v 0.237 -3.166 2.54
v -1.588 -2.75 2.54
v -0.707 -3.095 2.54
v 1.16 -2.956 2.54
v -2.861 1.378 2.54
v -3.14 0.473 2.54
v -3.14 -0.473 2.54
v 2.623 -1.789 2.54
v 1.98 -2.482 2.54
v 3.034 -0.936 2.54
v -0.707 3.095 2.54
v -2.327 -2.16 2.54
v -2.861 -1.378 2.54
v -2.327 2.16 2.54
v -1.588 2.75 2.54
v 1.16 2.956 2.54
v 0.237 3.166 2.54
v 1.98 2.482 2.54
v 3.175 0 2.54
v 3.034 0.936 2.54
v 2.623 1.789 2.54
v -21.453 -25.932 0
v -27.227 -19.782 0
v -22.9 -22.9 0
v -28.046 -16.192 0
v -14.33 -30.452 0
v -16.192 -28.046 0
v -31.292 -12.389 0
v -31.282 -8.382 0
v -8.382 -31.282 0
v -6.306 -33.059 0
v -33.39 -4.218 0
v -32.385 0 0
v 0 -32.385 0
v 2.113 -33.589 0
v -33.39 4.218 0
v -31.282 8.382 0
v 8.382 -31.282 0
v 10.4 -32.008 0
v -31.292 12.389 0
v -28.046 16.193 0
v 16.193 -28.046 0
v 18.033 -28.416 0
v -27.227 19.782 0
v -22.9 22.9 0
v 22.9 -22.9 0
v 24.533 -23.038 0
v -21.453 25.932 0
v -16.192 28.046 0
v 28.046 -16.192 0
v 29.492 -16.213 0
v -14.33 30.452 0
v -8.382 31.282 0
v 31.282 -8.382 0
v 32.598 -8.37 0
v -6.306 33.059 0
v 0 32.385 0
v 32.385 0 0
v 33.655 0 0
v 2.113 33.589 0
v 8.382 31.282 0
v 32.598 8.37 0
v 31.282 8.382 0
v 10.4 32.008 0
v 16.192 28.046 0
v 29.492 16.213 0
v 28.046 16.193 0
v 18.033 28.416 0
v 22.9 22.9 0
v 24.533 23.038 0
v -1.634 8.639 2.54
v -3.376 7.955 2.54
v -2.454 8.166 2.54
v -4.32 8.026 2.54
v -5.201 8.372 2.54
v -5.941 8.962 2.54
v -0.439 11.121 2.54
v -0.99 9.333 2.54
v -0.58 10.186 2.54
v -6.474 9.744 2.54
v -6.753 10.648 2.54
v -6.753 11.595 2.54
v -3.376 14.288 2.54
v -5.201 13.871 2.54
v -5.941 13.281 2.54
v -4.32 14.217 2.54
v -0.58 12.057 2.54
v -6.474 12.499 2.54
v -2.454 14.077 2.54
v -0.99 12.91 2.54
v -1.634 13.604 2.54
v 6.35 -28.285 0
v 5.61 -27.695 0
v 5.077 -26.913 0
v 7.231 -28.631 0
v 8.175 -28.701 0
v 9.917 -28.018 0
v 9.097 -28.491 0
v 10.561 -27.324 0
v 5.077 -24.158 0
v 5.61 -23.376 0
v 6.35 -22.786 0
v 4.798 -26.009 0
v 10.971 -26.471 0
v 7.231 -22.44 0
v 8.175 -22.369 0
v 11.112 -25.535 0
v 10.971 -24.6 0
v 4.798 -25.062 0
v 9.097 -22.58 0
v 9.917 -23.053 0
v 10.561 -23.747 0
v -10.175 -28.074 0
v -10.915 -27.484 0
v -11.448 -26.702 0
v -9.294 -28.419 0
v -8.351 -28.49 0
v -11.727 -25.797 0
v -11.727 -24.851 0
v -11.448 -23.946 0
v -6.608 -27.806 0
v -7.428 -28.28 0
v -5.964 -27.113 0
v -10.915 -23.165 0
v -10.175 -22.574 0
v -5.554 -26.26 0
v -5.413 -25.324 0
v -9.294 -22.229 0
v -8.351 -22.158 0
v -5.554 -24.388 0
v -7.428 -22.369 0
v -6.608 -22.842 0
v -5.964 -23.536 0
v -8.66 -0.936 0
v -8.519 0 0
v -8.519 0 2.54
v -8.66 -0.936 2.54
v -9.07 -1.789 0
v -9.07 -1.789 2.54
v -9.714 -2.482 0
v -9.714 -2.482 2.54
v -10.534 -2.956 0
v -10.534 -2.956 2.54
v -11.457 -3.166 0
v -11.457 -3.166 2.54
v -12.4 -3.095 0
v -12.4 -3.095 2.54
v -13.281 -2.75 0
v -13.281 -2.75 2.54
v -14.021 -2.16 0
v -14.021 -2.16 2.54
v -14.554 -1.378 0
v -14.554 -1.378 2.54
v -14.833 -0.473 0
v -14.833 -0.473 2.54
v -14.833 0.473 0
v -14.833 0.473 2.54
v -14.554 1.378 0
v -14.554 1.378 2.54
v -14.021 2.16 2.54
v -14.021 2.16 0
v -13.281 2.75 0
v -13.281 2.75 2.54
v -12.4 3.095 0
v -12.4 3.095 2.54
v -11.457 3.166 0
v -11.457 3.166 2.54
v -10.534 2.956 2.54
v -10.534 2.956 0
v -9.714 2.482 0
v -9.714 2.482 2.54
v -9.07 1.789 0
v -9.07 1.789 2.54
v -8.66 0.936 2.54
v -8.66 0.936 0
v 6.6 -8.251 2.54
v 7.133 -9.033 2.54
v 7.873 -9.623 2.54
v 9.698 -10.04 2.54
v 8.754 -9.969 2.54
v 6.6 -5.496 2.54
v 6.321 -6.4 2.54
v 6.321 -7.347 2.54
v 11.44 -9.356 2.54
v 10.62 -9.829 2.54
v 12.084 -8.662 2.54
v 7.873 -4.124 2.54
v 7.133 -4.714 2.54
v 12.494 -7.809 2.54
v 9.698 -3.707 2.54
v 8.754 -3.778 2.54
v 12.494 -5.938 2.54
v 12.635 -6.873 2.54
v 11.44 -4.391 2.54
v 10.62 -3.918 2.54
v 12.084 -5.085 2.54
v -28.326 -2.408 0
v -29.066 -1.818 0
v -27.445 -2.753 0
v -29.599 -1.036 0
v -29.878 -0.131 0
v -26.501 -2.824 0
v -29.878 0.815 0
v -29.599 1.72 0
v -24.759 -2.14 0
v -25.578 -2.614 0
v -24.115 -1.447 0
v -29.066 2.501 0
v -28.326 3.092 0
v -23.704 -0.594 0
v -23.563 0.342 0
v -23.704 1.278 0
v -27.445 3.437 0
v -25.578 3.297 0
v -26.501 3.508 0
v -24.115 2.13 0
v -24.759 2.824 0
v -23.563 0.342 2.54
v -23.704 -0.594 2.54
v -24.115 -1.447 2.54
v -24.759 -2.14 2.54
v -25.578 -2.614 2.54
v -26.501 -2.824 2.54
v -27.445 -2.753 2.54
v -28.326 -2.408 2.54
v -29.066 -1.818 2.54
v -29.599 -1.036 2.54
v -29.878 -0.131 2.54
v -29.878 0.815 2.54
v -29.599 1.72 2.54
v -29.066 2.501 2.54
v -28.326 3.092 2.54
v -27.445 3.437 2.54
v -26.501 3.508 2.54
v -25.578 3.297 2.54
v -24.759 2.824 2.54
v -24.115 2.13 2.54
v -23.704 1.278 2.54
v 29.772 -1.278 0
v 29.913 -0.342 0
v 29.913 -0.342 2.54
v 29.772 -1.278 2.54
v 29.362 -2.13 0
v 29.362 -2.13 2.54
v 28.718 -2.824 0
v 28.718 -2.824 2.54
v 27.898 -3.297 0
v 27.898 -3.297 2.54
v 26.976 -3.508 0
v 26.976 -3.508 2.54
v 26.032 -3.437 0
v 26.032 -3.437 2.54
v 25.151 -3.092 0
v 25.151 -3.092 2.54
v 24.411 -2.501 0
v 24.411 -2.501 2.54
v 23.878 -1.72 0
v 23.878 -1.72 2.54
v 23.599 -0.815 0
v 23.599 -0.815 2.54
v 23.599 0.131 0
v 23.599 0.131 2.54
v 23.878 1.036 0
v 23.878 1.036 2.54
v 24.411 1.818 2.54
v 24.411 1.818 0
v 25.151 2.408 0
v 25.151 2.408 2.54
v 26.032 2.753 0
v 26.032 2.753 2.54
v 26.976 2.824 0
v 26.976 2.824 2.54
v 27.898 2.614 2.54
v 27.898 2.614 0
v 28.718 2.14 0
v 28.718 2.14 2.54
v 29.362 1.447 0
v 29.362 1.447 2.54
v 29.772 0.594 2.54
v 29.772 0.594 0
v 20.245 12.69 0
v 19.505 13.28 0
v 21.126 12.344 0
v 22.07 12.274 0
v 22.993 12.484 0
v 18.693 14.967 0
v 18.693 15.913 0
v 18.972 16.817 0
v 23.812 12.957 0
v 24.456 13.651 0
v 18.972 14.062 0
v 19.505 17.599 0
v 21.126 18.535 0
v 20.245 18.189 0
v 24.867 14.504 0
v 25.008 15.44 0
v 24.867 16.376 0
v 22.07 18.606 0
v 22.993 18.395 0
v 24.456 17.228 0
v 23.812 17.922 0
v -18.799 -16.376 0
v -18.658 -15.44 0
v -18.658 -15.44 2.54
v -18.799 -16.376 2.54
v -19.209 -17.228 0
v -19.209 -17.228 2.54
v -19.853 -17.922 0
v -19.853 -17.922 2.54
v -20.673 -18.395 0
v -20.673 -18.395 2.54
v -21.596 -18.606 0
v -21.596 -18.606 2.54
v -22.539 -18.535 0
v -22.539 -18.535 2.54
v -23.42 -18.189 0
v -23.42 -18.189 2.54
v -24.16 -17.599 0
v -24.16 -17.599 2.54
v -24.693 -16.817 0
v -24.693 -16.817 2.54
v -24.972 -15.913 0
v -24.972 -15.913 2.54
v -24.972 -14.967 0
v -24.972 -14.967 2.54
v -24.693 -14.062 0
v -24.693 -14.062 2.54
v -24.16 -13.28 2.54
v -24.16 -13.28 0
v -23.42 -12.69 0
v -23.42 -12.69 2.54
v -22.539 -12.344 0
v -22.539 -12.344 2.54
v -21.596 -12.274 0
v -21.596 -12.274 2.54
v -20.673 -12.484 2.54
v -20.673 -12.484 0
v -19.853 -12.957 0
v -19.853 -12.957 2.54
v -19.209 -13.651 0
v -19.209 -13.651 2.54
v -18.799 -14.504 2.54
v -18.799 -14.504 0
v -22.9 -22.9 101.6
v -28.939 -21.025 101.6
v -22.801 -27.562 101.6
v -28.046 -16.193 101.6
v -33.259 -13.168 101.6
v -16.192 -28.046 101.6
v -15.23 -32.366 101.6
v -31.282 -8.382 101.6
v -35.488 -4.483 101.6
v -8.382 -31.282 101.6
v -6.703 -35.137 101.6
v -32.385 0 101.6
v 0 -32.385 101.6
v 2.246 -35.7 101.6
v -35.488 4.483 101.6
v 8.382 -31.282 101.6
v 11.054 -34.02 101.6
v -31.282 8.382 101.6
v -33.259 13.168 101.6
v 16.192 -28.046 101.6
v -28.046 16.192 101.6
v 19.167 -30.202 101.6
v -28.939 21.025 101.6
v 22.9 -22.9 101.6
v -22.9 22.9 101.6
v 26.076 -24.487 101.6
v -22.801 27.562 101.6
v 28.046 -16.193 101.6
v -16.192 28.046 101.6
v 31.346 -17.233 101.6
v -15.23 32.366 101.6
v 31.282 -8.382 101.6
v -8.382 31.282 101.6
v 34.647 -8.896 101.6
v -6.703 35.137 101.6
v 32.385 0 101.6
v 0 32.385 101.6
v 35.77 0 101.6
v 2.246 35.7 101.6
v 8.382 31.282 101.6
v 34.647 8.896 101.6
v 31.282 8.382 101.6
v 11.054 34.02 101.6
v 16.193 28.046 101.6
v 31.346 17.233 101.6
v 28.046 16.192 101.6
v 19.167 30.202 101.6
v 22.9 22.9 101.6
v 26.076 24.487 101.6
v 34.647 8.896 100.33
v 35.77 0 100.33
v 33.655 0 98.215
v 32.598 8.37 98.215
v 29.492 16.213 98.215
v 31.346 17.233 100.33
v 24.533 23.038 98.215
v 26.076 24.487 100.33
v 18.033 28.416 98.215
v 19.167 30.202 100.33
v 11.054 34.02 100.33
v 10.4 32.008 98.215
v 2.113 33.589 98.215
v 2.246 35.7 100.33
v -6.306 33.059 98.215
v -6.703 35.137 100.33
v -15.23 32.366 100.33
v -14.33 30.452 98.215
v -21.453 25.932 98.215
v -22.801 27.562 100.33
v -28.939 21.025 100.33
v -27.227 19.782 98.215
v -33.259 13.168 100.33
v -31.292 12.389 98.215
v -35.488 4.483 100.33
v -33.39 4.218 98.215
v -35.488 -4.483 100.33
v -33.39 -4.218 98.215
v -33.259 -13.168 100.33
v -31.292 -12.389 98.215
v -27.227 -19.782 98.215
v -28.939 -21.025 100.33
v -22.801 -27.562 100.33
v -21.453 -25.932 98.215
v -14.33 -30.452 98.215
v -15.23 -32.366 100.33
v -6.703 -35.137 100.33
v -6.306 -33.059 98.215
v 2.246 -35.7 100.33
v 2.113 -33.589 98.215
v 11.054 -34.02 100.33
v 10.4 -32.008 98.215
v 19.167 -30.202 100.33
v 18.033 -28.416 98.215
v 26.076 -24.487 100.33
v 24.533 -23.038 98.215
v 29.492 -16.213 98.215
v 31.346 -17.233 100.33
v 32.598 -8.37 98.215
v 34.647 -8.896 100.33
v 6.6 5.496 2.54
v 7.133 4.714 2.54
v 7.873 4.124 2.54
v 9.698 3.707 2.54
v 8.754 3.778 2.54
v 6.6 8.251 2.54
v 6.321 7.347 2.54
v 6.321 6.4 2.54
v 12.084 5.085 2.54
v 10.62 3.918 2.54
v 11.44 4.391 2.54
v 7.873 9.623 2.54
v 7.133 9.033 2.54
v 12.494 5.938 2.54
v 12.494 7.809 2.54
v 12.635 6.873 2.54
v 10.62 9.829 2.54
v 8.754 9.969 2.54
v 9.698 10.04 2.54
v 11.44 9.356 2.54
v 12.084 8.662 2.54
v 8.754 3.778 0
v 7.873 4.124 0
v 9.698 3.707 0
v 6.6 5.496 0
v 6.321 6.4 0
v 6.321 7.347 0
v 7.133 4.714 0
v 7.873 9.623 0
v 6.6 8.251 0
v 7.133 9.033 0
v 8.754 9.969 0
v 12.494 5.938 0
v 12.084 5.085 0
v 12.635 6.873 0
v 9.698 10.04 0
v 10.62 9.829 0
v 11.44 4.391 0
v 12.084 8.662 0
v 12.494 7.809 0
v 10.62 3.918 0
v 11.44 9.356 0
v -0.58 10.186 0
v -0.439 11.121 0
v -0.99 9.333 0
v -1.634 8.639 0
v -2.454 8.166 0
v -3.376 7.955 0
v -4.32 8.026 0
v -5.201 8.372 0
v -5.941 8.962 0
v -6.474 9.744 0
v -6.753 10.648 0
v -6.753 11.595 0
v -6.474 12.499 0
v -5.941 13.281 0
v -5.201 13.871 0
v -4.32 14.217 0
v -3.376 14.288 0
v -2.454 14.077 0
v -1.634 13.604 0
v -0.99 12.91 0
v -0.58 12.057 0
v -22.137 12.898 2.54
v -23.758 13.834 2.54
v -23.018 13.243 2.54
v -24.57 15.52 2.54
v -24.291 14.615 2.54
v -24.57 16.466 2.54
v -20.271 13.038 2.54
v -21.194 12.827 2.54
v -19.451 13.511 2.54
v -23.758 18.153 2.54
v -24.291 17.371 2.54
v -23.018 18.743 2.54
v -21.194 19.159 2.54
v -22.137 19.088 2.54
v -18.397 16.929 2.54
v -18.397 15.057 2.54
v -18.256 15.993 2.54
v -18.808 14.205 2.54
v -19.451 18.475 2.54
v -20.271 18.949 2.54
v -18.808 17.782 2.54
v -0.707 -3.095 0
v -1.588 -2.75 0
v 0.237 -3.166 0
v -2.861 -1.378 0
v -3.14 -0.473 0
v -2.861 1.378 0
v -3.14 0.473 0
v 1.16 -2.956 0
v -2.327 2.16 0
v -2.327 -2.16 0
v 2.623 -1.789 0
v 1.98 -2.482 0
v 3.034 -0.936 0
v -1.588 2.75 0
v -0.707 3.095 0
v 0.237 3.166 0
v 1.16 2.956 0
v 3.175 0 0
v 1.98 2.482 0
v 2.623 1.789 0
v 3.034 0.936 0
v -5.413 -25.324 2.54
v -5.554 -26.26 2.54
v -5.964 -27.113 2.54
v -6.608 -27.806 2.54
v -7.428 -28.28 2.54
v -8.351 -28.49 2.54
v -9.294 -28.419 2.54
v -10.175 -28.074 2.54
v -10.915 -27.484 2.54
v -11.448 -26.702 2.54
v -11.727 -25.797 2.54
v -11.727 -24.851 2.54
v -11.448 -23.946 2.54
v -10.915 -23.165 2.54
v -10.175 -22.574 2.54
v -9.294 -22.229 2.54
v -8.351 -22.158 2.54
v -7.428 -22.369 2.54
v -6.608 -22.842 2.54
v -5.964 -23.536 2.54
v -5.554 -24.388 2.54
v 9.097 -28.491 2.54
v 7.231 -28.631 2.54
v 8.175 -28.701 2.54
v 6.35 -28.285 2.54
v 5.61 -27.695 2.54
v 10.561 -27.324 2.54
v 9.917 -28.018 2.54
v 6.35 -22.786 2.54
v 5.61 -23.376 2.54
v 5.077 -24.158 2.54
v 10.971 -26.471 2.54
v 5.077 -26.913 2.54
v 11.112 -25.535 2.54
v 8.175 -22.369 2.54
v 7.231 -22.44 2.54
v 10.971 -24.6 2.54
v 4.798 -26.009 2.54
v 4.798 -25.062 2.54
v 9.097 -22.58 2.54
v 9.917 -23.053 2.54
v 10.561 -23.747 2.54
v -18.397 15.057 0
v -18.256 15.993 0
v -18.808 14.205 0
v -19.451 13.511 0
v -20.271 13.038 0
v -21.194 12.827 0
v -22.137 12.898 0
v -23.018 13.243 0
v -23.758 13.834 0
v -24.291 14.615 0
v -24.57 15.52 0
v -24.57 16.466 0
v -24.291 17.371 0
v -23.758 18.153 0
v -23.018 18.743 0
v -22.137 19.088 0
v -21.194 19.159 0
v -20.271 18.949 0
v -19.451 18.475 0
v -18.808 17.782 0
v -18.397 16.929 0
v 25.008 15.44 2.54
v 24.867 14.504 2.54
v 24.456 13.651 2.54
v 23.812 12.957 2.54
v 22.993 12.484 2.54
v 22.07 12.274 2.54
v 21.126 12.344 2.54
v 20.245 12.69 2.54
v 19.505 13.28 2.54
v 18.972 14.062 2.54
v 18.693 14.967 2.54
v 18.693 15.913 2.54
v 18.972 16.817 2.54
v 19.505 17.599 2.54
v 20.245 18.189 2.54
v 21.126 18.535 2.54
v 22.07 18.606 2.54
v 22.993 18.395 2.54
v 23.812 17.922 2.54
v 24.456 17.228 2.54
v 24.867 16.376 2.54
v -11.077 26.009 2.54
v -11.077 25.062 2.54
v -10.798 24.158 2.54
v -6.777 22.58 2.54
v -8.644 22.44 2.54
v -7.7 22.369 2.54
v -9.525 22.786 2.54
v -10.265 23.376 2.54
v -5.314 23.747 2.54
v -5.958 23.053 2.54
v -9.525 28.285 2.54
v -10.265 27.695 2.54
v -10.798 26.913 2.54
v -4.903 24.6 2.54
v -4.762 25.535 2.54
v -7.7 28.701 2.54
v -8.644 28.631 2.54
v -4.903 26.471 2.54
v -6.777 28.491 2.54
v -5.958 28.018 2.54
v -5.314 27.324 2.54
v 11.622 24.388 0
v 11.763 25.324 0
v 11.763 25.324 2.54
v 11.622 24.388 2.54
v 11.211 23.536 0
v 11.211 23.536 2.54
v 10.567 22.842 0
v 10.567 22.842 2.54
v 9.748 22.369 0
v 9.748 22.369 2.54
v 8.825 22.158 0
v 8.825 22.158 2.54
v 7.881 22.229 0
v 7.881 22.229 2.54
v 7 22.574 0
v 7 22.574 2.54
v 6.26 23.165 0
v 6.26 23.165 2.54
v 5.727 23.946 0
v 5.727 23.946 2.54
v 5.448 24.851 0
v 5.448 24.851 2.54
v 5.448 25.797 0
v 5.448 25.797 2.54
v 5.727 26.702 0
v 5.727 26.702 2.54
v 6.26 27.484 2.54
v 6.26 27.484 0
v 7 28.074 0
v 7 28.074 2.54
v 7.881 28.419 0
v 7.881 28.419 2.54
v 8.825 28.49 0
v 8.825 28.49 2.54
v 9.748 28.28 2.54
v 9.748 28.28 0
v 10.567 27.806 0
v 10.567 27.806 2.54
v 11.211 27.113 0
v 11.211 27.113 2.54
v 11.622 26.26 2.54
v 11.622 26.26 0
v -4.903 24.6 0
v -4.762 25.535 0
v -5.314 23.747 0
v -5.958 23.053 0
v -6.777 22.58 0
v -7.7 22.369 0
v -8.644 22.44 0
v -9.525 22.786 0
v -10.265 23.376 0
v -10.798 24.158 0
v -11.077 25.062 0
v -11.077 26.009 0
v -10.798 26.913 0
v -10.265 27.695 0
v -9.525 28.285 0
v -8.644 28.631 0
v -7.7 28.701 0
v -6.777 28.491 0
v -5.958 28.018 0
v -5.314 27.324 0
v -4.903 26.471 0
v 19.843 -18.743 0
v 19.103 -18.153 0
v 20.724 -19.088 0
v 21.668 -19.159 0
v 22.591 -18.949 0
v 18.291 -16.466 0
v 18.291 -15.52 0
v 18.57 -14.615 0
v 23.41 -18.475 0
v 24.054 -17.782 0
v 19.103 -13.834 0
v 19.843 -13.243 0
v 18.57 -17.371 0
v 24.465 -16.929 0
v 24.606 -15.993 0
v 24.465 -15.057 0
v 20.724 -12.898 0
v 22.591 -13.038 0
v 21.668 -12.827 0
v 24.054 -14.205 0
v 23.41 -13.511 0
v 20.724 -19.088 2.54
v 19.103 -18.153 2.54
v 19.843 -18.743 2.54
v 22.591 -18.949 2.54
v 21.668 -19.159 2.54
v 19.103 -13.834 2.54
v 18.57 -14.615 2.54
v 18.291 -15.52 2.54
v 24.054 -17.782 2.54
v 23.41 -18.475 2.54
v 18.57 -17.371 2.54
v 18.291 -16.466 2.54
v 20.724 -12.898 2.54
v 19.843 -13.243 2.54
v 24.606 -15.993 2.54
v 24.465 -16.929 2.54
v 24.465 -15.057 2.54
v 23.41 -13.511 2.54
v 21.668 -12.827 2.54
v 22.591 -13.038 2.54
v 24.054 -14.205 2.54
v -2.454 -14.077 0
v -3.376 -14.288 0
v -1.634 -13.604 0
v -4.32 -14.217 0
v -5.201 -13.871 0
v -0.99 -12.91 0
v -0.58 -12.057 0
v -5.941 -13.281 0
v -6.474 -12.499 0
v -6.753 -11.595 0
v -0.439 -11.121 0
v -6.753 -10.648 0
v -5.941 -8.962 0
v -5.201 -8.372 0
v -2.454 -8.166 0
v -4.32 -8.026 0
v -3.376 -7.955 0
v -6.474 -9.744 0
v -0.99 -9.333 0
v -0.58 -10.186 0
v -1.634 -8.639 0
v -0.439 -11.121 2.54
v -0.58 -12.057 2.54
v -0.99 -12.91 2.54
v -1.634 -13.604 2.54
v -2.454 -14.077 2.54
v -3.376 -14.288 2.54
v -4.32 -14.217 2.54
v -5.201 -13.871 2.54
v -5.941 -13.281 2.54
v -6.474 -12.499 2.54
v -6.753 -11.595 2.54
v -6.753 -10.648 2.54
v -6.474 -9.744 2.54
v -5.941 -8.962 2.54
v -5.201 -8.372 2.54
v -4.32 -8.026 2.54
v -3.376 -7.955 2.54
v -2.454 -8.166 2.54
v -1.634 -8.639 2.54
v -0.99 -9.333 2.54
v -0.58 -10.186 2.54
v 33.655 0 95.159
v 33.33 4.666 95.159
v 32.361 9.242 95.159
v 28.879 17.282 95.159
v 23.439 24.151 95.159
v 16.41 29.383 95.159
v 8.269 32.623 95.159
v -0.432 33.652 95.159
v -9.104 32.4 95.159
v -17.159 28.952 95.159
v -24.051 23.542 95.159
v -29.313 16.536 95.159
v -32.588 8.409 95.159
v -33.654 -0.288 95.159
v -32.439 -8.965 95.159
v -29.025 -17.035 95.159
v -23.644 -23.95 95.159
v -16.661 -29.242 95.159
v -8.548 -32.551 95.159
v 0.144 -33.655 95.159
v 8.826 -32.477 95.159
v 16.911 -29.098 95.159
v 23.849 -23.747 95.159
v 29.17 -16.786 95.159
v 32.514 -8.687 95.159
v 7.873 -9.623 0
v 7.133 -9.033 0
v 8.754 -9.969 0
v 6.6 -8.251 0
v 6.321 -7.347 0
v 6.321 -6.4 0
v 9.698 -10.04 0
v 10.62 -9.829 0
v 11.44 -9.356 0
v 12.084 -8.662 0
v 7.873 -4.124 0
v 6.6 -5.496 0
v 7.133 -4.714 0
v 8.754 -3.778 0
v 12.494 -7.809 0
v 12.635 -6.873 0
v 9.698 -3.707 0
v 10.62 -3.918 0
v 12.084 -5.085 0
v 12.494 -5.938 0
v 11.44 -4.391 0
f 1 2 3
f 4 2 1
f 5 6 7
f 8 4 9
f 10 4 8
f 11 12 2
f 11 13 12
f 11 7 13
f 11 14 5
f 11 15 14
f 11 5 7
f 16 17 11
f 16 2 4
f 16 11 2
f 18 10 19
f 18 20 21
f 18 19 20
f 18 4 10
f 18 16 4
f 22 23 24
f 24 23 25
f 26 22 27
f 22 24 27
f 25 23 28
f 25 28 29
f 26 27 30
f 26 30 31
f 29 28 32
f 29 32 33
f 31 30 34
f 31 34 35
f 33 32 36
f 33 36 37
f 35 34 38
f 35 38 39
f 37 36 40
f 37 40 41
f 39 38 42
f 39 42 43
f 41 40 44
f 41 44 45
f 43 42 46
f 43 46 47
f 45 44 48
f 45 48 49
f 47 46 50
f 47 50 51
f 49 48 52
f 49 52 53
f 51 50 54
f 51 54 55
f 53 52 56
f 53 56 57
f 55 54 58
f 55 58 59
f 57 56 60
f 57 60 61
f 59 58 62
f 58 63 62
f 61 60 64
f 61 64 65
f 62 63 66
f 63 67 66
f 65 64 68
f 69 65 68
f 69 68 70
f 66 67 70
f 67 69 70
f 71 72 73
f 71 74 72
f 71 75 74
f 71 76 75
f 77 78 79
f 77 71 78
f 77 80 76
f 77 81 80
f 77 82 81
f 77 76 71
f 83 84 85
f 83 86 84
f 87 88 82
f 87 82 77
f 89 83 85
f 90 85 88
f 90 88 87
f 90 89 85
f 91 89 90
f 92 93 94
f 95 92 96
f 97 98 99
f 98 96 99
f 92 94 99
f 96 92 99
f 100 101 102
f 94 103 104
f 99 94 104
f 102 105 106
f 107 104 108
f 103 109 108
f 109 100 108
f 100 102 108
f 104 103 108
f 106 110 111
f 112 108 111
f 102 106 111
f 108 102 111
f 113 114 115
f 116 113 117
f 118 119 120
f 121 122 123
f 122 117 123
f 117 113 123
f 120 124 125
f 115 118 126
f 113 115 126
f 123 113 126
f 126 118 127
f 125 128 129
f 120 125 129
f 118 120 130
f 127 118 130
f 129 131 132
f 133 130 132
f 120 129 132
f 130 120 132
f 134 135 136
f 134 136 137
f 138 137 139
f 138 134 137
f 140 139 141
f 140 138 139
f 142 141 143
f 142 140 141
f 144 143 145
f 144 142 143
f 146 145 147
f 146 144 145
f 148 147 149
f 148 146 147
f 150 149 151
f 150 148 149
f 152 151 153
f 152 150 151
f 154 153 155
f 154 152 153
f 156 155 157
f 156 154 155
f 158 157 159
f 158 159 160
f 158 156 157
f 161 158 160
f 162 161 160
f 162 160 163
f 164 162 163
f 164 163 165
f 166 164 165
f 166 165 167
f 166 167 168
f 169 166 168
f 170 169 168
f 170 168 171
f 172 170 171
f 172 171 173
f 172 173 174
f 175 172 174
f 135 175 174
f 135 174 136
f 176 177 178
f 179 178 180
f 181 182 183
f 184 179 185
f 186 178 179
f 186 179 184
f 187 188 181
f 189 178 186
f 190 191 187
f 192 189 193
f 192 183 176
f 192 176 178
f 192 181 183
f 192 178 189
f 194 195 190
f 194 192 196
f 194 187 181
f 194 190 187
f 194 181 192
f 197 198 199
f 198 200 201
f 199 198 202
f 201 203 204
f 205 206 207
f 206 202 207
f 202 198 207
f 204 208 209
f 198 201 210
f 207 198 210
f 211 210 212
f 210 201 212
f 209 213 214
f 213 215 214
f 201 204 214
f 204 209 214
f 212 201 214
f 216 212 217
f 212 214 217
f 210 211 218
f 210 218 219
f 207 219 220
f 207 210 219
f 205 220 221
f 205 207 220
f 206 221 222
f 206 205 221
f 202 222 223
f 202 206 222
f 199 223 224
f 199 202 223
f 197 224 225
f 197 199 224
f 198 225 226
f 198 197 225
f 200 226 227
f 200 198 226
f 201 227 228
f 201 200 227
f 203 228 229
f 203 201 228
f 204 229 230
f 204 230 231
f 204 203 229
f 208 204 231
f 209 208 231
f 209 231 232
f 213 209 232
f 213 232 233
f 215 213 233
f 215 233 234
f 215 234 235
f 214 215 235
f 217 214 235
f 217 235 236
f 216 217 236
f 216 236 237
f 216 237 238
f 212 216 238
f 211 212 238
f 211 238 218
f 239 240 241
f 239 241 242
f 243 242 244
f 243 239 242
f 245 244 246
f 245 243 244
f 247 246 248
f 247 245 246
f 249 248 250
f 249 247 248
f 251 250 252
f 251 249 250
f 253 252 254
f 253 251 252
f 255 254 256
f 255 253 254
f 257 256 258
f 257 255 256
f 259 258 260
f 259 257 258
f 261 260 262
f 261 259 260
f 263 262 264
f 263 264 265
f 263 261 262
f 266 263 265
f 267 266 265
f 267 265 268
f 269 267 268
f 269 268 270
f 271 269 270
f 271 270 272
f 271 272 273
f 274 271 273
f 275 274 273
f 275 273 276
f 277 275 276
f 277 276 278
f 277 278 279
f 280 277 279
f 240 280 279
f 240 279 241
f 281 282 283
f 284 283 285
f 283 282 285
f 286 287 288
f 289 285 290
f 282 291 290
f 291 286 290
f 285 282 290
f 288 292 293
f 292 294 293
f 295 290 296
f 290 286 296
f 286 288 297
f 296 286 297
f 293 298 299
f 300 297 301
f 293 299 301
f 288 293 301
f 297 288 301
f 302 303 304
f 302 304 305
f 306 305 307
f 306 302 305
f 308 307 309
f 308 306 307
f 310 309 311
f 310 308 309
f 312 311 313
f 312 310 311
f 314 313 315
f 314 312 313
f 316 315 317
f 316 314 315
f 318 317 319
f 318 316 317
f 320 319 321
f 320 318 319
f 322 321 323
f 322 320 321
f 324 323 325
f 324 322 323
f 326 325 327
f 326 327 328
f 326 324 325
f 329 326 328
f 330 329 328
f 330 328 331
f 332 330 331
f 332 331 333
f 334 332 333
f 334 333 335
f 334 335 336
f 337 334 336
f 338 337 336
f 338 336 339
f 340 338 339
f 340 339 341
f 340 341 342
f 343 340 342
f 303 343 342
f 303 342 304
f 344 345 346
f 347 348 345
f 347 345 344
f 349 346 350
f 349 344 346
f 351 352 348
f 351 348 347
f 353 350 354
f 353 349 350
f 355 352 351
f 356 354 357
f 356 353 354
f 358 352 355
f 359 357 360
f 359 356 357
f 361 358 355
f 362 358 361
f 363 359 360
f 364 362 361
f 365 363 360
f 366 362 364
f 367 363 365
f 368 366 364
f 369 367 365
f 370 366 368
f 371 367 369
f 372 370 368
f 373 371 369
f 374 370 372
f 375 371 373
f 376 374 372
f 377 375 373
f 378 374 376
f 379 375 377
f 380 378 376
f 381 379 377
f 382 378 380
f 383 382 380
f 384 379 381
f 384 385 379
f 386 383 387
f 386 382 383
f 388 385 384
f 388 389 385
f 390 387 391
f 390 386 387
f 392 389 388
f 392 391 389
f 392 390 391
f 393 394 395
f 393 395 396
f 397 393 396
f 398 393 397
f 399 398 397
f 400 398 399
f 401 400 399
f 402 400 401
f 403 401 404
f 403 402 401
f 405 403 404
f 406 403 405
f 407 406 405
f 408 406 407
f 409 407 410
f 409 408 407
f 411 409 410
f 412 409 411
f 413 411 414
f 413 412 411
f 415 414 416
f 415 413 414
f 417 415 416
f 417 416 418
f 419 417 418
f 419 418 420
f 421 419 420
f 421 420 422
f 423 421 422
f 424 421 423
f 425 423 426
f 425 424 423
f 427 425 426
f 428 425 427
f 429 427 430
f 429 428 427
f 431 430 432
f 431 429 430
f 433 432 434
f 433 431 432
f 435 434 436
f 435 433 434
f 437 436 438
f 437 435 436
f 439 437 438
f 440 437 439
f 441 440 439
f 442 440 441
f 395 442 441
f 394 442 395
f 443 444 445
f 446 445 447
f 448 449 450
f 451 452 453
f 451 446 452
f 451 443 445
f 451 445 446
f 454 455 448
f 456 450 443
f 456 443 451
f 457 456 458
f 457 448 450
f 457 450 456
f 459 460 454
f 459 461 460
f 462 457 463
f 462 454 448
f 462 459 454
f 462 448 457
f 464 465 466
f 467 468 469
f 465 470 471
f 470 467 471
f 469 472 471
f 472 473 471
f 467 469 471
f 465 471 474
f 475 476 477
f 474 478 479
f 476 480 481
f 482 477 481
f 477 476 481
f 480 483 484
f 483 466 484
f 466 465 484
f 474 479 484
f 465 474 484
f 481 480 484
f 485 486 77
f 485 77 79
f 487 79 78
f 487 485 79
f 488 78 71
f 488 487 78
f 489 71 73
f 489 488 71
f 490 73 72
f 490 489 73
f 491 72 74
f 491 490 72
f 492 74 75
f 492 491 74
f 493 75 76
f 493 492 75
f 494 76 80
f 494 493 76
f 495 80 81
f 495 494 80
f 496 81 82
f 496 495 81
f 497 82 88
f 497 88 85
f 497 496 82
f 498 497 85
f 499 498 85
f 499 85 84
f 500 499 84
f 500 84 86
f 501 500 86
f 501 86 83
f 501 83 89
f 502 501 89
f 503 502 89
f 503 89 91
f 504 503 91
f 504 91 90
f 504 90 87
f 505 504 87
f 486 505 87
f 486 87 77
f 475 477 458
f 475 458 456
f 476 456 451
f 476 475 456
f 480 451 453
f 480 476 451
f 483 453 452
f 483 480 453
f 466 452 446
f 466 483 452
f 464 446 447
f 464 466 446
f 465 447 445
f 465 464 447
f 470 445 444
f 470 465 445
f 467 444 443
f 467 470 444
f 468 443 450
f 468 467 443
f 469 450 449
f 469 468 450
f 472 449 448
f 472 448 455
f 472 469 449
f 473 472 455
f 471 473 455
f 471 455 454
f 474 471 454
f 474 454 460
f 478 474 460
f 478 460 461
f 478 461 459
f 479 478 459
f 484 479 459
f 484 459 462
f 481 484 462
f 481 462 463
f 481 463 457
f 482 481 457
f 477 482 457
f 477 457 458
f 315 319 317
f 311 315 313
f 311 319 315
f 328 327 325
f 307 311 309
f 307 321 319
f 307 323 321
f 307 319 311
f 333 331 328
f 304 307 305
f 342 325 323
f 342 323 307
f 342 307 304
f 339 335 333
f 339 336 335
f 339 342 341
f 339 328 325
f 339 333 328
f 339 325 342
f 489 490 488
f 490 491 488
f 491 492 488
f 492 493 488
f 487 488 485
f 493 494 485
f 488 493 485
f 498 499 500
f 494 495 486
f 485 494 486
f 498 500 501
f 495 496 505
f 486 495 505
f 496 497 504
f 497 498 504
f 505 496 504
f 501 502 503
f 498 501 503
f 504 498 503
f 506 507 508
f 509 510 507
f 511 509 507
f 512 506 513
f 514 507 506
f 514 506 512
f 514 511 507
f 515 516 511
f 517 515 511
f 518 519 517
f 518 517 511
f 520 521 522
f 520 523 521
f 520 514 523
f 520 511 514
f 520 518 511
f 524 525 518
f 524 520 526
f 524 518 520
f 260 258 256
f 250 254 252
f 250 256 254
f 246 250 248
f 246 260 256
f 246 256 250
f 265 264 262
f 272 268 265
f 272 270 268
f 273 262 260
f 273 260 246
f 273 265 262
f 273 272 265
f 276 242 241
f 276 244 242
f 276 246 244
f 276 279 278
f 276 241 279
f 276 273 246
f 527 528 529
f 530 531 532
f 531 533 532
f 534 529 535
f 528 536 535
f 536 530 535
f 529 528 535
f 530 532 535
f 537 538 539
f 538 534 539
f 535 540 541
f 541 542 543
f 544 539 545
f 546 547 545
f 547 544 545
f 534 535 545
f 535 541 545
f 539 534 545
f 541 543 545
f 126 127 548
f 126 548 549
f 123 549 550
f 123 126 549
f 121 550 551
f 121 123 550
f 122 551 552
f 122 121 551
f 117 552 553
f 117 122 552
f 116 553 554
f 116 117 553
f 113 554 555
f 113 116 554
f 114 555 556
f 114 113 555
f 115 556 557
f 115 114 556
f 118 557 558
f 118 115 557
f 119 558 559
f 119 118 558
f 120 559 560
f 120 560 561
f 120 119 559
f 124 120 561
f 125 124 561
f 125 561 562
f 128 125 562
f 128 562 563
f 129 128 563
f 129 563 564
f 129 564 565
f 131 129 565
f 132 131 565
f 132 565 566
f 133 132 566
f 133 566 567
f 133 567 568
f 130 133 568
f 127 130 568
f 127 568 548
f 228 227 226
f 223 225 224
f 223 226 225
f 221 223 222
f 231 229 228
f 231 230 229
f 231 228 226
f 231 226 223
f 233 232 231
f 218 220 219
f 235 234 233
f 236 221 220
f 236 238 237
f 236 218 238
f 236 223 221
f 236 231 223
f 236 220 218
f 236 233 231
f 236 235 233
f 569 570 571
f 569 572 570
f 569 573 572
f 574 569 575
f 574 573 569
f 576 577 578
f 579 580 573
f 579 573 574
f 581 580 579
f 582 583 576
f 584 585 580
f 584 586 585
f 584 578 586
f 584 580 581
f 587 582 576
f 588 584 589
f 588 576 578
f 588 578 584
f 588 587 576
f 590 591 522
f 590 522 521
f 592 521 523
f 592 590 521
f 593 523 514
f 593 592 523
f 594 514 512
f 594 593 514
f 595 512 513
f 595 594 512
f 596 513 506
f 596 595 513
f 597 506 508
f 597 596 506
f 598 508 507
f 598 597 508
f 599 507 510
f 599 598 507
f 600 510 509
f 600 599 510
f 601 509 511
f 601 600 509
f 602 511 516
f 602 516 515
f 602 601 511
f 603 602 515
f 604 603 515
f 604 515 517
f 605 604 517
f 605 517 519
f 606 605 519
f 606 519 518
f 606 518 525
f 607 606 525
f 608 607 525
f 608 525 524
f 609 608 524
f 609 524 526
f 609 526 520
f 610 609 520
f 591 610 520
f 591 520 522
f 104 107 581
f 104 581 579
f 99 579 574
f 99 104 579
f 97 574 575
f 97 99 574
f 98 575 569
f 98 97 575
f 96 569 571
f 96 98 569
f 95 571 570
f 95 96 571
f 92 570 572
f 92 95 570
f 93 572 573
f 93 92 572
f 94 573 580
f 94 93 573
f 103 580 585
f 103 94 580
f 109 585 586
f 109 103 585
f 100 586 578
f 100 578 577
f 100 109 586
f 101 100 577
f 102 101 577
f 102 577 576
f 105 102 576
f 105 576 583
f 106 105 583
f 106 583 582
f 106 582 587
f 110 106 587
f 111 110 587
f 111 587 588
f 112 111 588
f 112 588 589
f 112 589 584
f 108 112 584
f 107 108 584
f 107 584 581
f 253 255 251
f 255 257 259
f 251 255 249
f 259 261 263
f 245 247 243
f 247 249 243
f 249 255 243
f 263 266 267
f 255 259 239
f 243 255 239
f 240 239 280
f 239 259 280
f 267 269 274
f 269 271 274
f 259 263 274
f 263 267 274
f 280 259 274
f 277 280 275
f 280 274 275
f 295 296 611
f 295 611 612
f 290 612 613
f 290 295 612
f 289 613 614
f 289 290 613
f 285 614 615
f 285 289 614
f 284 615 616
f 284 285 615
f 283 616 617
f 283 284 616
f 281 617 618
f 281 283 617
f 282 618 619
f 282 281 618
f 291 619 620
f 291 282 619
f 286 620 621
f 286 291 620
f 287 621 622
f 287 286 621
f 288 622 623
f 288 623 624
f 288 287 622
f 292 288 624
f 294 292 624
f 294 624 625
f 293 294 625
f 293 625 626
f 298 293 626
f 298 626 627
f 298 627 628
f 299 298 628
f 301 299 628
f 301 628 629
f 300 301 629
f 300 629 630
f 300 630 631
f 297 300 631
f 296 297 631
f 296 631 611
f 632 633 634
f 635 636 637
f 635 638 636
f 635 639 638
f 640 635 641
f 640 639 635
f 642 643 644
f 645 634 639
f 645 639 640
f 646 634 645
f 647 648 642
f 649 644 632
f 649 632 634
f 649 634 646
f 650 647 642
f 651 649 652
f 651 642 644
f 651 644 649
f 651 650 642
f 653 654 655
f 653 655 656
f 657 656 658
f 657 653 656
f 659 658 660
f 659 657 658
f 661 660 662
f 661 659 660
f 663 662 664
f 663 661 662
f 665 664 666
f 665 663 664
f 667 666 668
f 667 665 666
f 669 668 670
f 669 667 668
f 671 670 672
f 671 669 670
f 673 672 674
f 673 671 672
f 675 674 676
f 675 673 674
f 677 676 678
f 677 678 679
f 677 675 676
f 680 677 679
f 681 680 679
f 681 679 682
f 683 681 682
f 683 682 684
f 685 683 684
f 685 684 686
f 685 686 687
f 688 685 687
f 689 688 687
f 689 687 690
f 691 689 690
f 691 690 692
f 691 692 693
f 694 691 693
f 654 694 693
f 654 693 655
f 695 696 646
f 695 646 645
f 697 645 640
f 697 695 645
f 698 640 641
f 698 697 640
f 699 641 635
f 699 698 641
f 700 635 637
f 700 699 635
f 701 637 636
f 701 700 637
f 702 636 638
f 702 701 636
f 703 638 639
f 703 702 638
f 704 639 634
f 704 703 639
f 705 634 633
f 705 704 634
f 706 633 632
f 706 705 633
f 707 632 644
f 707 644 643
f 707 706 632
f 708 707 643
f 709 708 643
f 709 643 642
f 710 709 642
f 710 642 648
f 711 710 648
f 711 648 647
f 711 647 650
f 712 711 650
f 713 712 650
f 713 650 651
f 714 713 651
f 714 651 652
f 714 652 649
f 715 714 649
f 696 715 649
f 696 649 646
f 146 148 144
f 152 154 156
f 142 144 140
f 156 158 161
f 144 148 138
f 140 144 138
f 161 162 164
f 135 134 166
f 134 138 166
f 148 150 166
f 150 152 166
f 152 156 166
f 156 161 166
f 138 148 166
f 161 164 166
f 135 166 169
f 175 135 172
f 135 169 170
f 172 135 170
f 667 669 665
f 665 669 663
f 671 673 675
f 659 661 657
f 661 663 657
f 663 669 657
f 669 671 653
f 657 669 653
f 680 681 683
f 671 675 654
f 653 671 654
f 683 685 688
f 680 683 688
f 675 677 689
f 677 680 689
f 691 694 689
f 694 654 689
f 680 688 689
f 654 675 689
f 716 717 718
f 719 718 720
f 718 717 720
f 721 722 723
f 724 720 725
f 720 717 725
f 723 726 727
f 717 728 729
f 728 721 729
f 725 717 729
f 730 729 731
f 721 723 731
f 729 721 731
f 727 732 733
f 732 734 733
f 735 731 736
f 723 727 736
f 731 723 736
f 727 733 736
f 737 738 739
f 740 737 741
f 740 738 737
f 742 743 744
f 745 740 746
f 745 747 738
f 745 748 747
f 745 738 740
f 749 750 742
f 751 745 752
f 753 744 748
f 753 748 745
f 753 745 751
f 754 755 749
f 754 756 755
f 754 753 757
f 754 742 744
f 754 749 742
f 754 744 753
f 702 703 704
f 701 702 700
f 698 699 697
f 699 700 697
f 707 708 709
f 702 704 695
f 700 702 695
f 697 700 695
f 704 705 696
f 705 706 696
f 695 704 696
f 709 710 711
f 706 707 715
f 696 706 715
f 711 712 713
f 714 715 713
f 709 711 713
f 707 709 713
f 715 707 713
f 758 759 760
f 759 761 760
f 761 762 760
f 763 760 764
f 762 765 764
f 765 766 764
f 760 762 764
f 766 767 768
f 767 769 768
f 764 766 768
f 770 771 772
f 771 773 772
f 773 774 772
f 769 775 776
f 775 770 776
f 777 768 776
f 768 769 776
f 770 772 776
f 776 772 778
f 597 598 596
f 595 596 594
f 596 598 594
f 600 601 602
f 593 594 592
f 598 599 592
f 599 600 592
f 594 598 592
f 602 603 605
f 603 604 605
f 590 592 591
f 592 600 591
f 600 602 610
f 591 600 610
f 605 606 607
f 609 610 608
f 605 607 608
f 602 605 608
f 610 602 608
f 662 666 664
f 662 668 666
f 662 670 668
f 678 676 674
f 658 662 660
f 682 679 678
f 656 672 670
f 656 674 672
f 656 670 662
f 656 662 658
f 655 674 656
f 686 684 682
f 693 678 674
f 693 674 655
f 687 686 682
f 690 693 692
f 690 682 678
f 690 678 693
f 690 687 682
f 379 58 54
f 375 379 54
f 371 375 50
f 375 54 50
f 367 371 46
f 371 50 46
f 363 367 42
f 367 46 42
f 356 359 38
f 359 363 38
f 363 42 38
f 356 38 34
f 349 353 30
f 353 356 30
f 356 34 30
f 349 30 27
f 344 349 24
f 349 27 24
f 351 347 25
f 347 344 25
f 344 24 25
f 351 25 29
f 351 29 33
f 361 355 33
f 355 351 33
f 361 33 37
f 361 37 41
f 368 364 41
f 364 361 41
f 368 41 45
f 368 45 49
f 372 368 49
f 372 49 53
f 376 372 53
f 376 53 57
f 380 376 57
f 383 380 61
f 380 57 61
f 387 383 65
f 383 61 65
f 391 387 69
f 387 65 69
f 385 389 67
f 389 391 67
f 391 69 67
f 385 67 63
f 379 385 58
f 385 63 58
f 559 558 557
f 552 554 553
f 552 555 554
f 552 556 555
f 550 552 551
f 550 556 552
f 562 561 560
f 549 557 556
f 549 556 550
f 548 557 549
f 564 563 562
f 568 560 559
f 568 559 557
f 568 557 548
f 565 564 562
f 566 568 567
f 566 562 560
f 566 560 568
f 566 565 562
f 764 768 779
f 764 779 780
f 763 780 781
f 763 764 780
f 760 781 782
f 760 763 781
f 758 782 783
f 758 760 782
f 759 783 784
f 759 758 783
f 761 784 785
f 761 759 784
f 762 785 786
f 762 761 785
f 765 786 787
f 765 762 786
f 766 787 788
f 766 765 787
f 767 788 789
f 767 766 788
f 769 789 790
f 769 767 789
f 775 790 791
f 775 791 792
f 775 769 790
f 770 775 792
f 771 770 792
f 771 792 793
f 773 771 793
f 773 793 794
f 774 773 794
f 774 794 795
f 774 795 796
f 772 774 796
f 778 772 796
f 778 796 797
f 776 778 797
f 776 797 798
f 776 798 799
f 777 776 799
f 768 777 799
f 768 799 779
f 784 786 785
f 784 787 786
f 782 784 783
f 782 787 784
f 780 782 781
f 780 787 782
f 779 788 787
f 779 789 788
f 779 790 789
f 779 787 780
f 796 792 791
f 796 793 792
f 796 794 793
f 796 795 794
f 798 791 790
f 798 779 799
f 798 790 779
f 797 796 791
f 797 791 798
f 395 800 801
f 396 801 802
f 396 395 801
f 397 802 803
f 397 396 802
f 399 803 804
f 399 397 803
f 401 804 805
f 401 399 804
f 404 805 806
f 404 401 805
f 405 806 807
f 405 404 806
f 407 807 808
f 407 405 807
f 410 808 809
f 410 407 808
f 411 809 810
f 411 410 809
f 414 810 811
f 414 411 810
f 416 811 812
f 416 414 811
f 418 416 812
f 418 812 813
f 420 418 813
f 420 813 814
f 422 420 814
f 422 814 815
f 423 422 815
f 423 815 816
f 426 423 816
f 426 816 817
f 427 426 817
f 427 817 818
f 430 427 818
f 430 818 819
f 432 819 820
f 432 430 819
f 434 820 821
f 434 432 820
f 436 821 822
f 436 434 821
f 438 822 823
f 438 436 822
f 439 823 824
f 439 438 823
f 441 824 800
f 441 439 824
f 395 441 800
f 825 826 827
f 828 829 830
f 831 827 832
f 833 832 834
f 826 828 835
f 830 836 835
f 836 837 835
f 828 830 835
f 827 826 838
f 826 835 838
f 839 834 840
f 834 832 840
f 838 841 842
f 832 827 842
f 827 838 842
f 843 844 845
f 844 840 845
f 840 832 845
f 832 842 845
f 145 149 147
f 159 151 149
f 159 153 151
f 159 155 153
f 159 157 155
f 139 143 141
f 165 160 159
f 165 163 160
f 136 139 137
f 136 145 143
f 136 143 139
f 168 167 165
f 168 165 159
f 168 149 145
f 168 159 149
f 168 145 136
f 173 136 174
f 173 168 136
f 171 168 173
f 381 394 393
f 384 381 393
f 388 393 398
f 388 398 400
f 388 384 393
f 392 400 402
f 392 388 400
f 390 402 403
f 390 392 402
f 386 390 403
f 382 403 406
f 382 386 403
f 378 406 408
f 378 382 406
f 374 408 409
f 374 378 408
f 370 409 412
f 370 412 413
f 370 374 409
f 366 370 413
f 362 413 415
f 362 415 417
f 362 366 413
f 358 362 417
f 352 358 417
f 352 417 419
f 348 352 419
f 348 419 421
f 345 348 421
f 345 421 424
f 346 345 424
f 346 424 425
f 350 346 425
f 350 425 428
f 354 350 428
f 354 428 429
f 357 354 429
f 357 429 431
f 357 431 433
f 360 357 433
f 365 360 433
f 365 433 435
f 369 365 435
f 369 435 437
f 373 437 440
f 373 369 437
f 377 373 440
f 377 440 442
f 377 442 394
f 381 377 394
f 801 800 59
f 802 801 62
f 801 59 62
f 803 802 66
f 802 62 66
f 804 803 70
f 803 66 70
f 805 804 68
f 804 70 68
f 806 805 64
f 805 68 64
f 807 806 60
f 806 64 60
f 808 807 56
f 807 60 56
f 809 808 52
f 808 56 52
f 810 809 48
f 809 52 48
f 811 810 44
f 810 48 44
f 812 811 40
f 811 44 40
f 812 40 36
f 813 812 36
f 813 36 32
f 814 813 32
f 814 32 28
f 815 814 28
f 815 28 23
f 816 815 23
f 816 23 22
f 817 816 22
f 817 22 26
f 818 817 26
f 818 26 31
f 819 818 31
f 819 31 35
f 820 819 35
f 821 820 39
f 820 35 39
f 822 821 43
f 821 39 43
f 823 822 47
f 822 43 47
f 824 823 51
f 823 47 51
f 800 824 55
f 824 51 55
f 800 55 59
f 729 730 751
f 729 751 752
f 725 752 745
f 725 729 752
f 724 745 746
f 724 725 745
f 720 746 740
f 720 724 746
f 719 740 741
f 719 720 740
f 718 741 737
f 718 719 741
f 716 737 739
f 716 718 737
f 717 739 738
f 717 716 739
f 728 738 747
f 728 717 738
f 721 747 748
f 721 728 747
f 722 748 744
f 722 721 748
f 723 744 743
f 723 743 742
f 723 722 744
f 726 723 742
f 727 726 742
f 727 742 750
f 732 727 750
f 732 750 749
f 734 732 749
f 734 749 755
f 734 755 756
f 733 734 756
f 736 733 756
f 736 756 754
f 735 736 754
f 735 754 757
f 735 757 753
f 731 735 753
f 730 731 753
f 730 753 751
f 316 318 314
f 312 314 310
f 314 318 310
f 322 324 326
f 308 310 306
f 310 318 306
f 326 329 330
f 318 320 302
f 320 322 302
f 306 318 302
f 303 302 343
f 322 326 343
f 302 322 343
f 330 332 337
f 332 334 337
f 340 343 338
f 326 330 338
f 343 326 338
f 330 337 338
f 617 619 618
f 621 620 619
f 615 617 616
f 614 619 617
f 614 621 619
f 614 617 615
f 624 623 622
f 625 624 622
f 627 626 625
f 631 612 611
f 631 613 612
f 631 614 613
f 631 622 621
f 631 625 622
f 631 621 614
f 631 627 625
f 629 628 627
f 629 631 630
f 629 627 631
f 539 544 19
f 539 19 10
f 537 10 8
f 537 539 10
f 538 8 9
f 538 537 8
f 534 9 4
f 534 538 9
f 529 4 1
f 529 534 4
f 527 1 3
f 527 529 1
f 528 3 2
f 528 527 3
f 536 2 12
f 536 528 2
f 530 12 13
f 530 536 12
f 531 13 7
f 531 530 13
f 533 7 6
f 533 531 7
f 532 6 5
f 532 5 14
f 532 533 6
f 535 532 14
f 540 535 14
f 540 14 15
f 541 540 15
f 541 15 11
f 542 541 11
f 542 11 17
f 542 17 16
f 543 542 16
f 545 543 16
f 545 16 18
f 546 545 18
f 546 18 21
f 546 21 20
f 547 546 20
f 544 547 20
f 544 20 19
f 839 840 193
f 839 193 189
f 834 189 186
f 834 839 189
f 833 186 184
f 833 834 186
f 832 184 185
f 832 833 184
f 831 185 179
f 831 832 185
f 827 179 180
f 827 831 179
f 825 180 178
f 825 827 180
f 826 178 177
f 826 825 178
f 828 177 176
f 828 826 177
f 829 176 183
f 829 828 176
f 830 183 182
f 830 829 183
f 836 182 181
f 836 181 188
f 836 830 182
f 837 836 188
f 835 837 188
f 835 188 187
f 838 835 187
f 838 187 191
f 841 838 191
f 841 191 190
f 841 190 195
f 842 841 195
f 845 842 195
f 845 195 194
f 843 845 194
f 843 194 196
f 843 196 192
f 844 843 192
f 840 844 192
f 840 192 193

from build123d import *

# Parameters (mm, degrees)
F0_R        = 33.655
F0_R_2      = 32.385
F1_DEPTH    = 101.6
F2_R        = 33.3089939783
F3_DEPTH    = 2.54
F4_R        = 32.385
F4_R_2      = 3.175
F5_DEPTH    = 25.4
F6_R        = 35.7704476133
F6_R_2      = 33.0207785817
F7_DEPTH    = 6.35
F8_S5_R     = 33.655
F8_T6_DEPTH = 85


# Not quite as in the source:
# - a fillet or chamfer that OpenCascade refuses, or shapes differently, is made with other operations: its cross-section is extruded or revolved along the edge and cut away or added


with BuildPart() as f1:
    # F0 (on Top) → F1 (new body)
    with BuildSketch(Plane.XY):
        Circle(F0_R)
        Circle(F0_R_2, mode=Mode.SUBTRACT)
    extrude(amount=F1_DEPTH)

    # F2 (on Top) → F3 (join)
    with BuildSketch(Plane.XY):
        Circle(F2_R)
    extrude(amount=F3_DEPTH)

    # F4 (on face) → F5 (cut)
    with BuildSketch(Plane(origin=(0, 0, 0), x_dir=(1, 0, 0), z_dir=(0, 0, -1))):
        Circle(F4_R)
        with Locations((-7.9374271012, -25.5353750872)):
            Circle(F4_R_2, mode=Mode.SUBTRACT)
        with Locations((-21.4308303044, -15.993049812)):
            Circle(F4_R_2, mode=Mode.SUBTRACT)
        with Locations((-26.7383847386, -0.3419230925)):
            Circle(F4_R_2, mode=Mode.SUBTRACT)
        with Locations((-3.6135736787, -11.1214362212)):
            Circle(F4_R_2, mode=Mode.SUBTRACT)
        with Locations((8.5878034715, -25.3240549945)):
            Circle(F4_R_2, mode=Mode.SUBTRACT)
        with Locations((9.4604587116, -6.8734255884)):
            Circle(F4_R_2, mode=Mode.SUBTRACT)
        with Locations((21.8327850068, -15.4398066269)):
            Circle(F4_R_2, mode=Mode.SUBTRACT)
        with Locations((-21.8327850068, 15.4398066269)):
            Circle(F4_R_2, mode=Mode.SUBTRACT)
        with Locations((-11.6937700659, 0)):
            Circle(F4_R_2, mode=Mode.SUBTRACT)
        with Locations((-3.6135736787, 11.1214362212)):
            Circle(F4_R_2, mode=Mode.SUBTRACT)
        with Locations((-8.5878034715, 25.3240549945)):
            Circle(F4_R_2, mode=Mode.SUBTRACT)
        Circle(F4_R_2, mode=Mode.SUBTRACT)
        with Locations((9.4604587116, 6.8734255884)):
            Circle(F4_R_2, mode=Mode.SUBTRACT)
        with Locations((26.7383847386, 0.3419230925)):
            Circle(F4_R_2, mode=Mode.SUBTRACT)
        with Locations((21.4308303044, 15.993049812)):
            Circle(F4_R_2, mode=Mode.SUBTRACT)
        with Locations((7.9374271012, 25.5353750872)):
            Circle(F4_R_2, mode=Mode.SUBTRACT)
    extrude(amount=-F5_DEPTH, mode=Mode.SUBTRACT)

    # F6 (on face) → F7 (join)
    with BuildSketch(Plane.XY.offset(101.6)):
        Circle(F6_R)
        Circle(F6_R_2, mode=Mode.SUBTRACT)
    extrude(amount=-F7_DEPTH)

    # F8: chamfer of 5.08 on 1 edges, made by hand


with BuildPart() as f8_tool2:
    # F8_s3 → F8_t4 (revolve)
    with BuildSketch(Plane.XZ):
        with BuildLine():
            Line((30.5467635153, 95.1063159021), (35.9141317112, 100.4736840979))
            Line((35.9141317112, 100.4736840979), (36.0157317112, 100.4736840979))
            ThreePointArc((36.0157317112, 100.4736840979), (35.8720476133, 97.861842049), (35.8720476133, 95.25))
            Line((35.8720476133, 95.25), (35.7704476133, 95.1484))
            ThreePointArc((35.7704476133, 95.1484), (33.1586055643, 95.1484), (30.5467635153, 95.0047159021))
            Line((30.5467635153, 95.0047159021), (30.5467635153, 95.1063159021))
        make_face()
    revolve(axis=Axis((0, 0, 95.25), (0, 0, 1)))

    # F8_s5 → F8_t6 (cut, symmetric)
    with BuildSketch(Plane.XY.offset(96.6)):
        Circle(F8_S5_R)
    extrude(amount=F8_T6_DEPTH, both=True, mode=Mode.SUBTRACT)


with BuildPart() as f1_1:
    add(f1.part)

    # F8_t1: cut F8_tool2
    add(f8_tool2.part, mode=Mode.SUBTRACT)


solid = f1_1.part
